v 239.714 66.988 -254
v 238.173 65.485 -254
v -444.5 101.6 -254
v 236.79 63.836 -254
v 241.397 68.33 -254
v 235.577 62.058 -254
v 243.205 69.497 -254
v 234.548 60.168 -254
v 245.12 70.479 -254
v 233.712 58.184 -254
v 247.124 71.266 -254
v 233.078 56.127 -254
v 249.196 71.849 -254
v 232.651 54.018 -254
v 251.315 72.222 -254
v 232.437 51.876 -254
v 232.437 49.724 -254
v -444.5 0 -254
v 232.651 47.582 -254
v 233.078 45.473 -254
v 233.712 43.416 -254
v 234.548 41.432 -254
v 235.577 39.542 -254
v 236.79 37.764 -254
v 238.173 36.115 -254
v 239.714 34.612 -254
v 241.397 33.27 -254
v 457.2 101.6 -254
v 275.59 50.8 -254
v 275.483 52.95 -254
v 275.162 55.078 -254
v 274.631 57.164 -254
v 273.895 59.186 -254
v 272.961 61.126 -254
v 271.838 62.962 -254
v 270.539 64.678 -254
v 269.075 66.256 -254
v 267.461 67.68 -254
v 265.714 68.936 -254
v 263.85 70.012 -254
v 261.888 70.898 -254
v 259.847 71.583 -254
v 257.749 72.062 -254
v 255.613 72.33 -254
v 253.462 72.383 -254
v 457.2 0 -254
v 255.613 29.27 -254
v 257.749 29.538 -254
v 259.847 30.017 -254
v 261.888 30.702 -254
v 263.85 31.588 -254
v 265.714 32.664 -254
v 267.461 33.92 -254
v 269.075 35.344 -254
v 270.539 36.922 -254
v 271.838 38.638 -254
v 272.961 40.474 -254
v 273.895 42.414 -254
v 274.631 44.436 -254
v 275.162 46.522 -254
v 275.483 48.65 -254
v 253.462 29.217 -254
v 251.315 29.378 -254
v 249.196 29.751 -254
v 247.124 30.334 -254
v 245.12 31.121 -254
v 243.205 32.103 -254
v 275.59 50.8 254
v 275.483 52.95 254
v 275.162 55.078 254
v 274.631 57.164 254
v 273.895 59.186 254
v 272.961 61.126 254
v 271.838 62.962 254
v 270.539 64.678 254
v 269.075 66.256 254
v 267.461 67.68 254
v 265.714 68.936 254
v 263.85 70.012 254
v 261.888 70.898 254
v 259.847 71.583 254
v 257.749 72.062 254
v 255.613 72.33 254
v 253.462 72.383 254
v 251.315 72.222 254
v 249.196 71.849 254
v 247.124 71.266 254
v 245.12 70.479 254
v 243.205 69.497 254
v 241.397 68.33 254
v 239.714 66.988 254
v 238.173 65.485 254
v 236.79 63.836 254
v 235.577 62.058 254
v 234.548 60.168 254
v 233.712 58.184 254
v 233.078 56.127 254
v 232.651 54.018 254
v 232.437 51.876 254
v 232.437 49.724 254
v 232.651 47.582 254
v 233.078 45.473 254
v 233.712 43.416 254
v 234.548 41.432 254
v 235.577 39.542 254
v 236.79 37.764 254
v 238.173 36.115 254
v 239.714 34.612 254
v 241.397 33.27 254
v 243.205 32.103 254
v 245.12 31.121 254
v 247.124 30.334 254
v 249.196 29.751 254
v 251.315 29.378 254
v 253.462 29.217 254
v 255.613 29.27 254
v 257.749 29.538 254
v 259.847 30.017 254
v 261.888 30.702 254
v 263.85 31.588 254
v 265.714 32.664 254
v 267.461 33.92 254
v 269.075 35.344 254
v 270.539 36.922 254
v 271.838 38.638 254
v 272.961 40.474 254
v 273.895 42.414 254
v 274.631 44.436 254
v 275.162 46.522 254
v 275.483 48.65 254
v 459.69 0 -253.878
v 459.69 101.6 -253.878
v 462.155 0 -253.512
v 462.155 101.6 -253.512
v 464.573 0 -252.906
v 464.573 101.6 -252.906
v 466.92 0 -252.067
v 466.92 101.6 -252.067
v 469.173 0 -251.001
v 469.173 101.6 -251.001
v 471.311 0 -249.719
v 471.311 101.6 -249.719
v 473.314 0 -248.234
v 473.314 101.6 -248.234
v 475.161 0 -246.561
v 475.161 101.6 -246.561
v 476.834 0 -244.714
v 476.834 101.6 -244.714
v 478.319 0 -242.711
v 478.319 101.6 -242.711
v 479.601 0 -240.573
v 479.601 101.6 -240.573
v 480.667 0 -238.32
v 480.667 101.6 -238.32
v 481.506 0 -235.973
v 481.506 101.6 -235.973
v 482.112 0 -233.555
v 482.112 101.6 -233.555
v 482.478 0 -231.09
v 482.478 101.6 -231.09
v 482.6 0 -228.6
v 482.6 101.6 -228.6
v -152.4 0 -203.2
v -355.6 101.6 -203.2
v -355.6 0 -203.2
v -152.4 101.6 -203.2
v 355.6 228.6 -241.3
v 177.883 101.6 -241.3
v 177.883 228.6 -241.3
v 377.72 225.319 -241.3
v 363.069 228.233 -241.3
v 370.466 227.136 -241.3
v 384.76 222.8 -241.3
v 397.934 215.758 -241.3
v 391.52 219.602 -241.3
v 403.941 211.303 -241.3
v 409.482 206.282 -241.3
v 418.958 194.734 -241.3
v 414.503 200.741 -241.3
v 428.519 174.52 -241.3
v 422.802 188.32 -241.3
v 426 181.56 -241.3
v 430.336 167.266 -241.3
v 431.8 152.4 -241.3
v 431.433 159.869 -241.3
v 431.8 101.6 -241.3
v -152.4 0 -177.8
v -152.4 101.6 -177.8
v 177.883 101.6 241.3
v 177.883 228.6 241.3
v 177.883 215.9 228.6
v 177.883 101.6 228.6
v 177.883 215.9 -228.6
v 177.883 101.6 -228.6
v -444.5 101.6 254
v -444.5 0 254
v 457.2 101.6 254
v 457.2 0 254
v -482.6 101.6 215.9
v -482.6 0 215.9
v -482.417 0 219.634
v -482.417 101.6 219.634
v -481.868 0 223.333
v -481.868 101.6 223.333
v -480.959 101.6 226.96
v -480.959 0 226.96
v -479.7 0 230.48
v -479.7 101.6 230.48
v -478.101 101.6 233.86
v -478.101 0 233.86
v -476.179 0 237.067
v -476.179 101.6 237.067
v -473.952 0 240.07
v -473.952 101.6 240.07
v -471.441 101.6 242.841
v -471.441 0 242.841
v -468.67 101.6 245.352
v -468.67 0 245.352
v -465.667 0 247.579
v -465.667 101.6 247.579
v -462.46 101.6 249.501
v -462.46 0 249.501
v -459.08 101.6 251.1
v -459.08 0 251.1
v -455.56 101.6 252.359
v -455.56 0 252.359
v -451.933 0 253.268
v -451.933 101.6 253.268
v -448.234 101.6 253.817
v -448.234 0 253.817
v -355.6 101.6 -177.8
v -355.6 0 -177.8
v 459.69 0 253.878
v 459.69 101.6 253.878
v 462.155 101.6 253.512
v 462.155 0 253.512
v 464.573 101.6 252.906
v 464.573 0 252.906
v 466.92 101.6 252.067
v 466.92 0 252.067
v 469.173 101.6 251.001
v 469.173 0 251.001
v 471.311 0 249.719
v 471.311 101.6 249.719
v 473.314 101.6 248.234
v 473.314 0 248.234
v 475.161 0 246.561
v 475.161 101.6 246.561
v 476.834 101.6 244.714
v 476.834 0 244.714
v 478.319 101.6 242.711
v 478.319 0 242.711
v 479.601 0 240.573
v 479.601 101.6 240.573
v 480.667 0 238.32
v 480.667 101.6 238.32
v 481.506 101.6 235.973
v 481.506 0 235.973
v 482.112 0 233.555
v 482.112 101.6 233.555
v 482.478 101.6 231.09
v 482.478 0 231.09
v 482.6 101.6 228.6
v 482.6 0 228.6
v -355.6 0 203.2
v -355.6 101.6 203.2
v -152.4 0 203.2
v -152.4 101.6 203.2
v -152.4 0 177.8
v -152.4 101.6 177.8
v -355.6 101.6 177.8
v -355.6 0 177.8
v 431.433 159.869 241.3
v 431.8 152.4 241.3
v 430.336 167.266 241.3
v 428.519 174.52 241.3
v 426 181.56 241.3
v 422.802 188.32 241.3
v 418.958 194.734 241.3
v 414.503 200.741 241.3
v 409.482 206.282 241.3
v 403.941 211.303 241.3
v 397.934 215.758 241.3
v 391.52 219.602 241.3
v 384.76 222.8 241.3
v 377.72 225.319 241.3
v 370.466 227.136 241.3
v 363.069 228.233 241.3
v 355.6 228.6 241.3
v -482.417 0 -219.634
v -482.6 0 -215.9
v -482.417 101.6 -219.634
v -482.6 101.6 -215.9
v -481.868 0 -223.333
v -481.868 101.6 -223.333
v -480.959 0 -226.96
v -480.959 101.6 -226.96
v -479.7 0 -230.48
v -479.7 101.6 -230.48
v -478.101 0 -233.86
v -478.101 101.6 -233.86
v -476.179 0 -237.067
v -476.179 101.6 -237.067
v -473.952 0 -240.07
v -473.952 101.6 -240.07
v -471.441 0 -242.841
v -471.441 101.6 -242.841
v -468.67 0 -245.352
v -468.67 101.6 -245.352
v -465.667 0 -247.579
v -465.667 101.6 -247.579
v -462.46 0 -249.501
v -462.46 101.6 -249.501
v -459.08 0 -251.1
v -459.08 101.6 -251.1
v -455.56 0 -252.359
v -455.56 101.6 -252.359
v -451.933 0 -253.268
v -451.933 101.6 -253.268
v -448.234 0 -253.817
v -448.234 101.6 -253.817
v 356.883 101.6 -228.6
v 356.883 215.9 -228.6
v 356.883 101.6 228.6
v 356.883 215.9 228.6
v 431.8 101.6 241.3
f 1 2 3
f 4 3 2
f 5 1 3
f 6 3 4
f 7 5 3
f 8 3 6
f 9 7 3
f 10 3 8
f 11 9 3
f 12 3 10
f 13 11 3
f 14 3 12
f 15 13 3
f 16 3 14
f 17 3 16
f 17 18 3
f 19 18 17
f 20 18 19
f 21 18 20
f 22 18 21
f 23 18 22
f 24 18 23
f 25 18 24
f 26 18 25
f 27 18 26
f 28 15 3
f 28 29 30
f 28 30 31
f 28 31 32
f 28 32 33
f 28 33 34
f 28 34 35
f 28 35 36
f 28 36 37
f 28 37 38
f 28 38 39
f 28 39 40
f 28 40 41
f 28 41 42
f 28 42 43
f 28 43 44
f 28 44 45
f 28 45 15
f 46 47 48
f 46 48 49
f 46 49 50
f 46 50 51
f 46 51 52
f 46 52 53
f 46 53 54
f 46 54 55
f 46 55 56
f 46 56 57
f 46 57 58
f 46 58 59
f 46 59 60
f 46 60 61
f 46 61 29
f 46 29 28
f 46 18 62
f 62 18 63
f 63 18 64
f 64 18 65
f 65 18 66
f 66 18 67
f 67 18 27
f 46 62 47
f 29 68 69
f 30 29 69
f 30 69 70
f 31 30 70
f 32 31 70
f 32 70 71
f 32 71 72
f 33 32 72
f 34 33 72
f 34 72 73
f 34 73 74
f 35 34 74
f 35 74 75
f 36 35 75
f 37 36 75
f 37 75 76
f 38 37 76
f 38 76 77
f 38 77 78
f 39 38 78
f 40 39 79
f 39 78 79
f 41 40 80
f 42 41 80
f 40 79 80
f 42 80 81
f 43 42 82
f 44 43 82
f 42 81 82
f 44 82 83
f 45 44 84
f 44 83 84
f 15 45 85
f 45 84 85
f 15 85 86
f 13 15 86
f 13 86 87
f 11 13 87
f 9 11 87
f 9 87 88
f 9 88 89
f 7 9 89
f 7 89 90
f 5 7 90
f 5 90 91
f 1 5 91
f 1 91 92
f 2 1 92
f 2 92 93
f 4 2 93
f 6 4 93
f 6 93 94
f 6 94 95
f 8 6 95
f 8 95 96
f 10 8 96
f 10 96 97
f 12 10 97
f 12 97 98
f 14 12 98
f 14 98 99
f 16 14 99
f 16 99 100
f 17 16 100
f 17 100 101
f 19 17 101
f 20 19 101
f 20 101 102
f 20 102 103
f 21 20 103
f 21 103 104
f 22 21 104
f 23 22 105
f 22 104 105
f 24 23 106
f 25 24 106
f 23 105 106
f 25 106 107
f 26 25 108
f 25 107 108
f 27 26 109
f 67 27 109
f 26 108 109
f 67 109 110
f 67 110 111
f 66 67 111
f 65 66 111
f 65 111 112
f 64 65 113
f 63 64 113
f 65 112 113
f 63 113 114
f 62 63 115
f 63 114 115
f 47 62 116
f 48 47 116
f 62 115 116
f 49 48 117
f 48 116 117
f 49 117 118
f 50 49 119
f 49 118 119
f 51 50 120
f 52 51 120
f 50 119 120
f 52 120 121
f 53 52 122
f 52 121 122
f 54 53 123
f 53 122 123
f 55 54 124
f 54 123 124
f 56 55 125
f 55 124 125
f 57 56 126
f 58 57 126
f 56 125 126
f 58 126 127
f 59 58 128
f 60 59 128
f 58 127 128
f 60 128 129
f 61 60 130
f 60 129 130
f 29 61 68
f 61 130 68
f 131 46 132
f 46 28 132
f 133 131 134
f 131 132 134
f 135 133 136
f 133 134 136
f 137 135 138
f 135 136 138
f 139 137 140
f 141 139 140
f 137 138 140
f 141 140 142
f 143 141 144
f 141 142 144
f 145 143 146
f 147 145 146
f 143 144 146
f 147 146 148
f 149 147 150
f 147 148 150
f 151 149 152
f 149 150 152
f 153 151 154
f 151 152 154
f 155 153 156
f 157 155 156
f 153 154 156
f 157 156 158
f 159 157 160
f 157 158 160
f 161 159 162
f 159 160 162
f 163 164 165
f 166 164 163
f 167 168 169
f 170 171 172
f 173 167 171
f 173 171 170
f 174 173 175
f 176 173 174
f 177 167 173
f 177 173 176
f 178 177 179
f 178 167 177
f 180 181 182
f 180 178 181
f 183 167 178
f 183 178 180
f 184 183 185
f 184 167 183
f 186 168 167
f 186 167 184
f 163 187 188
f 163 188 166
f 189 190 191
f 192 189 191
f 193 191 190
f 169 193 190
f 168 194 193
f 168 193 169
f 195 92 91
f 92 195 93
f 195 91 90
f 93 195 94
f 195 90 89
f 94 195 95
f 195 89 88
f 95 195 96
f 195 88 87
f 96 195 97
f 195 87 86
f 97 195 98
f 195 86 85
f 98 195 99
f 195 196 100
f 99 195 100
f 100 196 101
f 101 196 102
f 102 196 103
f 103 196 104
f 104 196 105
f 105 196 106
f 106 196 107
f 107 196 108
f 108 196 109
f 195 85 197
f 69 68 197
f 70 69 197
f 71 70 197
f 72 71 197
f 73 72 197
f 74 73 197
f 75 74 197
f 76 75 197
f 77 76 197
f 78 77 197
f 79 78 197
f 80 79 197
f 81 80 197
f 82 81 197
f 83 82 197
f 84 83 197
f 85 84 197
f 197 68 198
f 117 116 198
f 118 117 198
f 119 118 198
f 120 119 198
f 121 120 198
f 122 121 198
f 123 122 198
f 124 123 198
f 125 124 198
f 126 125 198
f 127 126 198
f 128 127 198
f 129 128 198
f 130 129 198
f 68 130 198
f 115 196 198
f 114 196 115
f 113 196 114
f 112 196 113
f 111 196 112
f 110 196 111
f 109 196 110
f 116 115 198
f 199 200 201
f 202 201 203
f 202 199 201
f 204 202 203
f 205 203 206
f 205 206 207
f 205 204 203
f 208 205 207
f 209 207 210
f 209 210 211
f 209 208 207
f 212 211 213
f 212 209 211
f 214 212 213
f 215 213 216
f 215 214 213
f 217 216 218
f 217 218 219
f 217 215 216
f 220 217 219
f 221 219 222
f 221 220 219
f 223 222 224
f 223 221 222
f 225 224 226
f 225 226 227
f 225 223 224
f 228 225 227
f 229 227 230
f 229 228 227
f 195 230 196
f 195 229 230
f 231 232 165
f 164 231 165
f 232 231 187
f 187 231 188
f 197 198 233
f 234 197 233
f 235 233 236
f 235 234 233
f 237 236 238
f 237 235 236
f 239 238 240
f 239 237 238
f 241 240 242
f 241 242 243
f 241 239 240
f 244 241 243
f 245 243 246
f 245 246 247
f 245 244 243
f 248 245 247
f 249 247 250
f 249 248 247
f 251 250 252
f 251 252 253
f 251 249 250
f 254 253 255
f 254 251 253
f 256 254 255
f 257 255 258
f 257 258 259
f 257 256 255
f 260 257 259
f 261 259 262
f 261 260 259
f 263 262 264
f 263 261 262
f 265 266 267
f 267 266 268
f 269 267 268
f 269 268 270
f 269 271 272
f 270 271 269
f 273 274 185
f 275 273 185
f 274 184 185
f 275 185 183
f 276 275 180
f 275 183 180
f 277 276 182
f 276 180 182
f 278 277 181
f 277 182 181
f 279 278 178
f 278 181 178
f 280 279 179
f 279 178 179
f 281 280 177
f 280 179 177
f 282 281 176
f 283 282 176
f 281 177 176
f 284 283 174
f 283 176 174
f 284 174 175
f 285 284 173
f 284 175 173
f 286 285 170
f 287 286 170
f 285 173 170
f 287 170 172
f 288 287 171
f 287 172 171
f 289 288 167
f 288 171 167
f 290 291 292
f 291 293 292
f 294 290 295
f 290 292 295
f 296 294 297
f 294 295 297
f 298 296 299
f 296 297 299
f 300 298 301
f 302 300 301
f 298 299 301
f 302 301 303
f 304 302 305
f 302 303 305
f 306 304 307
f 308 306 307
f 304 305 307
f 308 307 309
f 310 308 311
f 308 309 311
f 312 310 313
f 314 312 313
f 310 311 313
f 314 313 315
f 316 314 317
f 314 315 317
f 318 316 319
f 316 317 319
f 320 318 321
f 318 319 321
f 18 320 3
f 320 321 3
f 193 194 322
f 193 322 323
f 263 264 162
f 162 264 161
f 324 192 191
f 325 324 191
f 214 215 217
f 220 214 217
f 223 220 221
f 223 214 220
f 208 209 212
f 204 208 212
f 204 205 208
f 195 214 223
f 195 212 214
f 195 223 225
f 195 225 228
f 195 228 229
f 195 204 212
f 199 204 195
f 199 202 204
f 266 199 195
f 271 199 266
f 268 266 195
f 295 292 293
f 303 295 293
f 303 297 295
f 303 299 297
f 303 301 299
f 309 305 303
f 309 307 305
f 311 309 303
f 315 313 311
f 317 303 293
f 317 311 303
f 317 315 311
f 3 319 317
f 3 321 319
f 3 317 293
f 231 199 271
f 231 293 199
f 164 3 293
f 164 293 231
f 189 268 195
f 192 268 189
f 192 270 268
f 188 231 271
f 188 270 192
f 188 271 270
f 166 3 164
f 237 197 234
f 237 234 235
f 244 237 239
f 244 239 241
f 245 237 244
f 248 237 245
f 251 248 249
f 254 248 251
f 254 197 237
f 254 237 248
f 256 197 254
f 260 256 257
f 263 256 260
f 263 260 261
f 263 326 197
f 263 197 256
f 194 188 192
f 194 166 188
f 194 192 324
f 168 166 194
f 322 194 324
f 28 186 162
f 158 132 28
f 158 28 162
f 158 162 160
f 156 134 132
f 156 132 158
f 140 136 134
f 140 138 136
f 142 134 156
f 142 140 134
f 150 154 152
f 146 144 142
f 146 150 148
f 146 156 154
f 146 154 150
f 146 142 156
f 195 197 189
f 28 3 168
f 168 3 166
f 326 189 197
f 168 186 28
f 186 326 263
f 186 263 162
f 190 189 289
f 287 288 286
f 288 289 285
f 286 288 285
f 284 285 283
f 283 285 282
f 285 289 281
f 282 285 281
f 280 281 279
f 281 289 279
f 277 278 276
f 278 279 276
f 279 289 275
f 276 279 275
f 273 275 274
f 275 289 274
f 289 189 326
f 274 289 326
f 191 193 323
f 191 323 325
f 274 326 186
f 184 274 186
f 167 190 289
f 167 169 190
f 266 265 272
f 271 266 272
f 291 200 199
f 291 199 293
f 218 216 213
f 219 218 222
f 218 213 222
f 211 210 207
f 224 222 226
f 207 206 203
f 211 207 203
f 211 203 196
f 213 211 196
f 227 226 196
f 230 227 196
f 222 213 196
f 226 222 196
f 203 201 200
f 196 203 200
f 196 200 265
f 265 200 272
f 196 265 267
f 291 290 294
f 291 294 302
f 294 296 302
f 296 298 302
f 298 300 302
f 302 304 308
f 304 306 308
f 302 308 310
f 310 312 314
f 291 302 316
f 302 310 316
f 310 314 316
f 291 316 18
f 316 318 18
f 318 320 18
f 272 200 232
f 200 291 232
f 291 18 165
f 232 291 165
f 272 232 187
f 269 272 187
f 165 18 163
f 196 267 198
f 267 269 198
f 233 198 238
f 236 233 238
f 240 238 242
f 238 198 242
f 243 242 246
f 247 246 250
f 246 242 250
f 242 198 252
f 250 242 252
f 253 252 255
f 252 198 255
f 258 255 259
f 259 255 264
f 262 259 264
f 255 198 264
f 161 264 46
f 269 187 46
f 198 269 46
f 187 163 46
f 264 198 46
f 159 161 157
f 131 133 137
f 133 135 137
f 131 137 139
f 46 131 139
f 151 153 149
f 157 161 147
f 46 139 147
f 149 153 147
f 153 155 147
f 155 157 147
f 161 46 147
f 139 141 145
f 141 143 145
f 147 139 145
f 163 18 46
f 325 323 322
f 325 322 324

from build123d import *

# Parameters (mm, degrees)
SKETCH1_W           = 965.2
SKETCH1_H           = 508
BOSS_EXTRUDE1_DEPTH = 101.6
SKETCH2_R           = 21.59
CUT_EXTRUDE1_DEPTH  = 509
FILLET1_R           = 38.1
FILLET2_R           = 25.4
CUT_EXTRUDE2_REACH  = 103.6
SKETCH4_W           = 203.2
SKETCH4_H           = 25.4
SKETCH6_W           = 253.917216802
SKETCH6_H           = 482.6
BOSS_EXTRUDE3_DEPTH = 127
FILLET4_R           = 76.2
SKETCH7_W           = 457.2
SKETCH7_H           = 114.3
CUT_EXTRUDE4_DEPTH  = 179


with BuildPart() as part:
    # Sketch1 → Boss-Extrude1 (new body)
    with BuildSketch(Plane(origin=(0, 0, 0), x_dir=(1, 0, 0), z_dir=(0, 1, 0))):
        Rectangle(SKETCH1_W, SKETCH1_H)
    extrude(amount=BOSS_EXTRUDE1_DEPTH)

    # Sketch2 → Cut-Extrude1 (cut, through all)
    with BuildSketch(Plane.XY.offset(254)):
        with Locations((254, 50.8)):
            Circle(SKETCH2_R)
    extrude(amount=-CUT_EXTRUDE1_DEPTH, mode=Mode.SUBTRACT)

    # Fillet1
    fillet1_edges = [part.edges().sort_by_distance(p)[0] for p in [
        (-482.6, 50.8, -254),
        (-482.6, 50.8, 254),
    ]]
    fillet(fillet1_edges, radius=FILLET1_R)

    # Fillet2
    fillet2_edges = [part.edges().sort_by_distance(p)[0] for p in [
        (482.6, 50.8, -254),
        (482.6, 50.8, 254),
    ]]
    fillet(fillet2_edges, radius=FILLET2_R)

    # Sketch4 → Cut-Extrude2 (cut, up to next)
    with BuildSketch(Plane(origin=(0, 101.6, 0), x_dir=(1, 0, 0), z_dir=(0, 1, 0)), mode=Mode.PRIVATE) as cut_extrude2_sk1:
        with Locations((-254, -190.5)):
            Rectangle(SKETCH4_W, SKETCH4_H)
    cut_extrude2_tool1 = extrude(cut_extrude2_sk1.sketch, amount=-CUT_EXTRUDE2_REACH, mode=Mode.PRIVATE) & part.part
    add(cut_extrude2_tool1.solids().sort_by_distance((-254, 101.6, 190.5))[0], mode=Mode.SUBTRACT)
    # Sketch4 → Cut-Extrude2 (cut, up to next)
    with BuildSketch(Plane(origin=(0, 101.6, 0), x_dir=(1, 0, 0), z_dir=(0, 1, 0)), mode=Mode.PRIVATE) as cut_extrude2_sk2:
        with Locations((-254, 190.5)):
            Rectangle(SKETCH4_W, SKETCH4_H)
    cut_extrude2_tool2 = extrude(cut_extrude2_sk2.sketch, amount=-CUT_EXTRUDE2_REACH, mode=Mode.PRIVATE) & part.part
    add(cut_extrude2_tool2.solids().sort_by_distance((-254, 101.6, -190.5))[0], mode=Mode.SUBTRACT)

    # Sketch6 → Boss-Extrude3 (add)
    with BuildSketch(Plane(origin=(0, 101.6, 0), x_dir=(1, 0, 0), z_dir=(0, 1, 0))):
        with Locations((304.841391599, 0)):
            Rectangle(SKETCH6_W, SKETCH6_H)
    extrude(amount=BOSS_EXTRUDE3_DEPTH)

    # Fillet4
    fillet4_edges = [part.edges().sort_by_distance(p)[0] for p in [
        (431.8, 228.6, 0),
    ]]
    fillet(fillet4_edges, radius=FILLET4_R)

    # Sketch7 → Cut-Extrude4 (cut)
    with BuildSketch(Plane.ZY.offset(-177.882783198)):
        with Locations((0, 158.75)):
            Rectangle(SKETCH7_W, SKETCH7_H)
    extrude(amount=-CUT_EXTRUDE4_DEPTH, mode=Mode.SUBTRACT)


solid = part.part
